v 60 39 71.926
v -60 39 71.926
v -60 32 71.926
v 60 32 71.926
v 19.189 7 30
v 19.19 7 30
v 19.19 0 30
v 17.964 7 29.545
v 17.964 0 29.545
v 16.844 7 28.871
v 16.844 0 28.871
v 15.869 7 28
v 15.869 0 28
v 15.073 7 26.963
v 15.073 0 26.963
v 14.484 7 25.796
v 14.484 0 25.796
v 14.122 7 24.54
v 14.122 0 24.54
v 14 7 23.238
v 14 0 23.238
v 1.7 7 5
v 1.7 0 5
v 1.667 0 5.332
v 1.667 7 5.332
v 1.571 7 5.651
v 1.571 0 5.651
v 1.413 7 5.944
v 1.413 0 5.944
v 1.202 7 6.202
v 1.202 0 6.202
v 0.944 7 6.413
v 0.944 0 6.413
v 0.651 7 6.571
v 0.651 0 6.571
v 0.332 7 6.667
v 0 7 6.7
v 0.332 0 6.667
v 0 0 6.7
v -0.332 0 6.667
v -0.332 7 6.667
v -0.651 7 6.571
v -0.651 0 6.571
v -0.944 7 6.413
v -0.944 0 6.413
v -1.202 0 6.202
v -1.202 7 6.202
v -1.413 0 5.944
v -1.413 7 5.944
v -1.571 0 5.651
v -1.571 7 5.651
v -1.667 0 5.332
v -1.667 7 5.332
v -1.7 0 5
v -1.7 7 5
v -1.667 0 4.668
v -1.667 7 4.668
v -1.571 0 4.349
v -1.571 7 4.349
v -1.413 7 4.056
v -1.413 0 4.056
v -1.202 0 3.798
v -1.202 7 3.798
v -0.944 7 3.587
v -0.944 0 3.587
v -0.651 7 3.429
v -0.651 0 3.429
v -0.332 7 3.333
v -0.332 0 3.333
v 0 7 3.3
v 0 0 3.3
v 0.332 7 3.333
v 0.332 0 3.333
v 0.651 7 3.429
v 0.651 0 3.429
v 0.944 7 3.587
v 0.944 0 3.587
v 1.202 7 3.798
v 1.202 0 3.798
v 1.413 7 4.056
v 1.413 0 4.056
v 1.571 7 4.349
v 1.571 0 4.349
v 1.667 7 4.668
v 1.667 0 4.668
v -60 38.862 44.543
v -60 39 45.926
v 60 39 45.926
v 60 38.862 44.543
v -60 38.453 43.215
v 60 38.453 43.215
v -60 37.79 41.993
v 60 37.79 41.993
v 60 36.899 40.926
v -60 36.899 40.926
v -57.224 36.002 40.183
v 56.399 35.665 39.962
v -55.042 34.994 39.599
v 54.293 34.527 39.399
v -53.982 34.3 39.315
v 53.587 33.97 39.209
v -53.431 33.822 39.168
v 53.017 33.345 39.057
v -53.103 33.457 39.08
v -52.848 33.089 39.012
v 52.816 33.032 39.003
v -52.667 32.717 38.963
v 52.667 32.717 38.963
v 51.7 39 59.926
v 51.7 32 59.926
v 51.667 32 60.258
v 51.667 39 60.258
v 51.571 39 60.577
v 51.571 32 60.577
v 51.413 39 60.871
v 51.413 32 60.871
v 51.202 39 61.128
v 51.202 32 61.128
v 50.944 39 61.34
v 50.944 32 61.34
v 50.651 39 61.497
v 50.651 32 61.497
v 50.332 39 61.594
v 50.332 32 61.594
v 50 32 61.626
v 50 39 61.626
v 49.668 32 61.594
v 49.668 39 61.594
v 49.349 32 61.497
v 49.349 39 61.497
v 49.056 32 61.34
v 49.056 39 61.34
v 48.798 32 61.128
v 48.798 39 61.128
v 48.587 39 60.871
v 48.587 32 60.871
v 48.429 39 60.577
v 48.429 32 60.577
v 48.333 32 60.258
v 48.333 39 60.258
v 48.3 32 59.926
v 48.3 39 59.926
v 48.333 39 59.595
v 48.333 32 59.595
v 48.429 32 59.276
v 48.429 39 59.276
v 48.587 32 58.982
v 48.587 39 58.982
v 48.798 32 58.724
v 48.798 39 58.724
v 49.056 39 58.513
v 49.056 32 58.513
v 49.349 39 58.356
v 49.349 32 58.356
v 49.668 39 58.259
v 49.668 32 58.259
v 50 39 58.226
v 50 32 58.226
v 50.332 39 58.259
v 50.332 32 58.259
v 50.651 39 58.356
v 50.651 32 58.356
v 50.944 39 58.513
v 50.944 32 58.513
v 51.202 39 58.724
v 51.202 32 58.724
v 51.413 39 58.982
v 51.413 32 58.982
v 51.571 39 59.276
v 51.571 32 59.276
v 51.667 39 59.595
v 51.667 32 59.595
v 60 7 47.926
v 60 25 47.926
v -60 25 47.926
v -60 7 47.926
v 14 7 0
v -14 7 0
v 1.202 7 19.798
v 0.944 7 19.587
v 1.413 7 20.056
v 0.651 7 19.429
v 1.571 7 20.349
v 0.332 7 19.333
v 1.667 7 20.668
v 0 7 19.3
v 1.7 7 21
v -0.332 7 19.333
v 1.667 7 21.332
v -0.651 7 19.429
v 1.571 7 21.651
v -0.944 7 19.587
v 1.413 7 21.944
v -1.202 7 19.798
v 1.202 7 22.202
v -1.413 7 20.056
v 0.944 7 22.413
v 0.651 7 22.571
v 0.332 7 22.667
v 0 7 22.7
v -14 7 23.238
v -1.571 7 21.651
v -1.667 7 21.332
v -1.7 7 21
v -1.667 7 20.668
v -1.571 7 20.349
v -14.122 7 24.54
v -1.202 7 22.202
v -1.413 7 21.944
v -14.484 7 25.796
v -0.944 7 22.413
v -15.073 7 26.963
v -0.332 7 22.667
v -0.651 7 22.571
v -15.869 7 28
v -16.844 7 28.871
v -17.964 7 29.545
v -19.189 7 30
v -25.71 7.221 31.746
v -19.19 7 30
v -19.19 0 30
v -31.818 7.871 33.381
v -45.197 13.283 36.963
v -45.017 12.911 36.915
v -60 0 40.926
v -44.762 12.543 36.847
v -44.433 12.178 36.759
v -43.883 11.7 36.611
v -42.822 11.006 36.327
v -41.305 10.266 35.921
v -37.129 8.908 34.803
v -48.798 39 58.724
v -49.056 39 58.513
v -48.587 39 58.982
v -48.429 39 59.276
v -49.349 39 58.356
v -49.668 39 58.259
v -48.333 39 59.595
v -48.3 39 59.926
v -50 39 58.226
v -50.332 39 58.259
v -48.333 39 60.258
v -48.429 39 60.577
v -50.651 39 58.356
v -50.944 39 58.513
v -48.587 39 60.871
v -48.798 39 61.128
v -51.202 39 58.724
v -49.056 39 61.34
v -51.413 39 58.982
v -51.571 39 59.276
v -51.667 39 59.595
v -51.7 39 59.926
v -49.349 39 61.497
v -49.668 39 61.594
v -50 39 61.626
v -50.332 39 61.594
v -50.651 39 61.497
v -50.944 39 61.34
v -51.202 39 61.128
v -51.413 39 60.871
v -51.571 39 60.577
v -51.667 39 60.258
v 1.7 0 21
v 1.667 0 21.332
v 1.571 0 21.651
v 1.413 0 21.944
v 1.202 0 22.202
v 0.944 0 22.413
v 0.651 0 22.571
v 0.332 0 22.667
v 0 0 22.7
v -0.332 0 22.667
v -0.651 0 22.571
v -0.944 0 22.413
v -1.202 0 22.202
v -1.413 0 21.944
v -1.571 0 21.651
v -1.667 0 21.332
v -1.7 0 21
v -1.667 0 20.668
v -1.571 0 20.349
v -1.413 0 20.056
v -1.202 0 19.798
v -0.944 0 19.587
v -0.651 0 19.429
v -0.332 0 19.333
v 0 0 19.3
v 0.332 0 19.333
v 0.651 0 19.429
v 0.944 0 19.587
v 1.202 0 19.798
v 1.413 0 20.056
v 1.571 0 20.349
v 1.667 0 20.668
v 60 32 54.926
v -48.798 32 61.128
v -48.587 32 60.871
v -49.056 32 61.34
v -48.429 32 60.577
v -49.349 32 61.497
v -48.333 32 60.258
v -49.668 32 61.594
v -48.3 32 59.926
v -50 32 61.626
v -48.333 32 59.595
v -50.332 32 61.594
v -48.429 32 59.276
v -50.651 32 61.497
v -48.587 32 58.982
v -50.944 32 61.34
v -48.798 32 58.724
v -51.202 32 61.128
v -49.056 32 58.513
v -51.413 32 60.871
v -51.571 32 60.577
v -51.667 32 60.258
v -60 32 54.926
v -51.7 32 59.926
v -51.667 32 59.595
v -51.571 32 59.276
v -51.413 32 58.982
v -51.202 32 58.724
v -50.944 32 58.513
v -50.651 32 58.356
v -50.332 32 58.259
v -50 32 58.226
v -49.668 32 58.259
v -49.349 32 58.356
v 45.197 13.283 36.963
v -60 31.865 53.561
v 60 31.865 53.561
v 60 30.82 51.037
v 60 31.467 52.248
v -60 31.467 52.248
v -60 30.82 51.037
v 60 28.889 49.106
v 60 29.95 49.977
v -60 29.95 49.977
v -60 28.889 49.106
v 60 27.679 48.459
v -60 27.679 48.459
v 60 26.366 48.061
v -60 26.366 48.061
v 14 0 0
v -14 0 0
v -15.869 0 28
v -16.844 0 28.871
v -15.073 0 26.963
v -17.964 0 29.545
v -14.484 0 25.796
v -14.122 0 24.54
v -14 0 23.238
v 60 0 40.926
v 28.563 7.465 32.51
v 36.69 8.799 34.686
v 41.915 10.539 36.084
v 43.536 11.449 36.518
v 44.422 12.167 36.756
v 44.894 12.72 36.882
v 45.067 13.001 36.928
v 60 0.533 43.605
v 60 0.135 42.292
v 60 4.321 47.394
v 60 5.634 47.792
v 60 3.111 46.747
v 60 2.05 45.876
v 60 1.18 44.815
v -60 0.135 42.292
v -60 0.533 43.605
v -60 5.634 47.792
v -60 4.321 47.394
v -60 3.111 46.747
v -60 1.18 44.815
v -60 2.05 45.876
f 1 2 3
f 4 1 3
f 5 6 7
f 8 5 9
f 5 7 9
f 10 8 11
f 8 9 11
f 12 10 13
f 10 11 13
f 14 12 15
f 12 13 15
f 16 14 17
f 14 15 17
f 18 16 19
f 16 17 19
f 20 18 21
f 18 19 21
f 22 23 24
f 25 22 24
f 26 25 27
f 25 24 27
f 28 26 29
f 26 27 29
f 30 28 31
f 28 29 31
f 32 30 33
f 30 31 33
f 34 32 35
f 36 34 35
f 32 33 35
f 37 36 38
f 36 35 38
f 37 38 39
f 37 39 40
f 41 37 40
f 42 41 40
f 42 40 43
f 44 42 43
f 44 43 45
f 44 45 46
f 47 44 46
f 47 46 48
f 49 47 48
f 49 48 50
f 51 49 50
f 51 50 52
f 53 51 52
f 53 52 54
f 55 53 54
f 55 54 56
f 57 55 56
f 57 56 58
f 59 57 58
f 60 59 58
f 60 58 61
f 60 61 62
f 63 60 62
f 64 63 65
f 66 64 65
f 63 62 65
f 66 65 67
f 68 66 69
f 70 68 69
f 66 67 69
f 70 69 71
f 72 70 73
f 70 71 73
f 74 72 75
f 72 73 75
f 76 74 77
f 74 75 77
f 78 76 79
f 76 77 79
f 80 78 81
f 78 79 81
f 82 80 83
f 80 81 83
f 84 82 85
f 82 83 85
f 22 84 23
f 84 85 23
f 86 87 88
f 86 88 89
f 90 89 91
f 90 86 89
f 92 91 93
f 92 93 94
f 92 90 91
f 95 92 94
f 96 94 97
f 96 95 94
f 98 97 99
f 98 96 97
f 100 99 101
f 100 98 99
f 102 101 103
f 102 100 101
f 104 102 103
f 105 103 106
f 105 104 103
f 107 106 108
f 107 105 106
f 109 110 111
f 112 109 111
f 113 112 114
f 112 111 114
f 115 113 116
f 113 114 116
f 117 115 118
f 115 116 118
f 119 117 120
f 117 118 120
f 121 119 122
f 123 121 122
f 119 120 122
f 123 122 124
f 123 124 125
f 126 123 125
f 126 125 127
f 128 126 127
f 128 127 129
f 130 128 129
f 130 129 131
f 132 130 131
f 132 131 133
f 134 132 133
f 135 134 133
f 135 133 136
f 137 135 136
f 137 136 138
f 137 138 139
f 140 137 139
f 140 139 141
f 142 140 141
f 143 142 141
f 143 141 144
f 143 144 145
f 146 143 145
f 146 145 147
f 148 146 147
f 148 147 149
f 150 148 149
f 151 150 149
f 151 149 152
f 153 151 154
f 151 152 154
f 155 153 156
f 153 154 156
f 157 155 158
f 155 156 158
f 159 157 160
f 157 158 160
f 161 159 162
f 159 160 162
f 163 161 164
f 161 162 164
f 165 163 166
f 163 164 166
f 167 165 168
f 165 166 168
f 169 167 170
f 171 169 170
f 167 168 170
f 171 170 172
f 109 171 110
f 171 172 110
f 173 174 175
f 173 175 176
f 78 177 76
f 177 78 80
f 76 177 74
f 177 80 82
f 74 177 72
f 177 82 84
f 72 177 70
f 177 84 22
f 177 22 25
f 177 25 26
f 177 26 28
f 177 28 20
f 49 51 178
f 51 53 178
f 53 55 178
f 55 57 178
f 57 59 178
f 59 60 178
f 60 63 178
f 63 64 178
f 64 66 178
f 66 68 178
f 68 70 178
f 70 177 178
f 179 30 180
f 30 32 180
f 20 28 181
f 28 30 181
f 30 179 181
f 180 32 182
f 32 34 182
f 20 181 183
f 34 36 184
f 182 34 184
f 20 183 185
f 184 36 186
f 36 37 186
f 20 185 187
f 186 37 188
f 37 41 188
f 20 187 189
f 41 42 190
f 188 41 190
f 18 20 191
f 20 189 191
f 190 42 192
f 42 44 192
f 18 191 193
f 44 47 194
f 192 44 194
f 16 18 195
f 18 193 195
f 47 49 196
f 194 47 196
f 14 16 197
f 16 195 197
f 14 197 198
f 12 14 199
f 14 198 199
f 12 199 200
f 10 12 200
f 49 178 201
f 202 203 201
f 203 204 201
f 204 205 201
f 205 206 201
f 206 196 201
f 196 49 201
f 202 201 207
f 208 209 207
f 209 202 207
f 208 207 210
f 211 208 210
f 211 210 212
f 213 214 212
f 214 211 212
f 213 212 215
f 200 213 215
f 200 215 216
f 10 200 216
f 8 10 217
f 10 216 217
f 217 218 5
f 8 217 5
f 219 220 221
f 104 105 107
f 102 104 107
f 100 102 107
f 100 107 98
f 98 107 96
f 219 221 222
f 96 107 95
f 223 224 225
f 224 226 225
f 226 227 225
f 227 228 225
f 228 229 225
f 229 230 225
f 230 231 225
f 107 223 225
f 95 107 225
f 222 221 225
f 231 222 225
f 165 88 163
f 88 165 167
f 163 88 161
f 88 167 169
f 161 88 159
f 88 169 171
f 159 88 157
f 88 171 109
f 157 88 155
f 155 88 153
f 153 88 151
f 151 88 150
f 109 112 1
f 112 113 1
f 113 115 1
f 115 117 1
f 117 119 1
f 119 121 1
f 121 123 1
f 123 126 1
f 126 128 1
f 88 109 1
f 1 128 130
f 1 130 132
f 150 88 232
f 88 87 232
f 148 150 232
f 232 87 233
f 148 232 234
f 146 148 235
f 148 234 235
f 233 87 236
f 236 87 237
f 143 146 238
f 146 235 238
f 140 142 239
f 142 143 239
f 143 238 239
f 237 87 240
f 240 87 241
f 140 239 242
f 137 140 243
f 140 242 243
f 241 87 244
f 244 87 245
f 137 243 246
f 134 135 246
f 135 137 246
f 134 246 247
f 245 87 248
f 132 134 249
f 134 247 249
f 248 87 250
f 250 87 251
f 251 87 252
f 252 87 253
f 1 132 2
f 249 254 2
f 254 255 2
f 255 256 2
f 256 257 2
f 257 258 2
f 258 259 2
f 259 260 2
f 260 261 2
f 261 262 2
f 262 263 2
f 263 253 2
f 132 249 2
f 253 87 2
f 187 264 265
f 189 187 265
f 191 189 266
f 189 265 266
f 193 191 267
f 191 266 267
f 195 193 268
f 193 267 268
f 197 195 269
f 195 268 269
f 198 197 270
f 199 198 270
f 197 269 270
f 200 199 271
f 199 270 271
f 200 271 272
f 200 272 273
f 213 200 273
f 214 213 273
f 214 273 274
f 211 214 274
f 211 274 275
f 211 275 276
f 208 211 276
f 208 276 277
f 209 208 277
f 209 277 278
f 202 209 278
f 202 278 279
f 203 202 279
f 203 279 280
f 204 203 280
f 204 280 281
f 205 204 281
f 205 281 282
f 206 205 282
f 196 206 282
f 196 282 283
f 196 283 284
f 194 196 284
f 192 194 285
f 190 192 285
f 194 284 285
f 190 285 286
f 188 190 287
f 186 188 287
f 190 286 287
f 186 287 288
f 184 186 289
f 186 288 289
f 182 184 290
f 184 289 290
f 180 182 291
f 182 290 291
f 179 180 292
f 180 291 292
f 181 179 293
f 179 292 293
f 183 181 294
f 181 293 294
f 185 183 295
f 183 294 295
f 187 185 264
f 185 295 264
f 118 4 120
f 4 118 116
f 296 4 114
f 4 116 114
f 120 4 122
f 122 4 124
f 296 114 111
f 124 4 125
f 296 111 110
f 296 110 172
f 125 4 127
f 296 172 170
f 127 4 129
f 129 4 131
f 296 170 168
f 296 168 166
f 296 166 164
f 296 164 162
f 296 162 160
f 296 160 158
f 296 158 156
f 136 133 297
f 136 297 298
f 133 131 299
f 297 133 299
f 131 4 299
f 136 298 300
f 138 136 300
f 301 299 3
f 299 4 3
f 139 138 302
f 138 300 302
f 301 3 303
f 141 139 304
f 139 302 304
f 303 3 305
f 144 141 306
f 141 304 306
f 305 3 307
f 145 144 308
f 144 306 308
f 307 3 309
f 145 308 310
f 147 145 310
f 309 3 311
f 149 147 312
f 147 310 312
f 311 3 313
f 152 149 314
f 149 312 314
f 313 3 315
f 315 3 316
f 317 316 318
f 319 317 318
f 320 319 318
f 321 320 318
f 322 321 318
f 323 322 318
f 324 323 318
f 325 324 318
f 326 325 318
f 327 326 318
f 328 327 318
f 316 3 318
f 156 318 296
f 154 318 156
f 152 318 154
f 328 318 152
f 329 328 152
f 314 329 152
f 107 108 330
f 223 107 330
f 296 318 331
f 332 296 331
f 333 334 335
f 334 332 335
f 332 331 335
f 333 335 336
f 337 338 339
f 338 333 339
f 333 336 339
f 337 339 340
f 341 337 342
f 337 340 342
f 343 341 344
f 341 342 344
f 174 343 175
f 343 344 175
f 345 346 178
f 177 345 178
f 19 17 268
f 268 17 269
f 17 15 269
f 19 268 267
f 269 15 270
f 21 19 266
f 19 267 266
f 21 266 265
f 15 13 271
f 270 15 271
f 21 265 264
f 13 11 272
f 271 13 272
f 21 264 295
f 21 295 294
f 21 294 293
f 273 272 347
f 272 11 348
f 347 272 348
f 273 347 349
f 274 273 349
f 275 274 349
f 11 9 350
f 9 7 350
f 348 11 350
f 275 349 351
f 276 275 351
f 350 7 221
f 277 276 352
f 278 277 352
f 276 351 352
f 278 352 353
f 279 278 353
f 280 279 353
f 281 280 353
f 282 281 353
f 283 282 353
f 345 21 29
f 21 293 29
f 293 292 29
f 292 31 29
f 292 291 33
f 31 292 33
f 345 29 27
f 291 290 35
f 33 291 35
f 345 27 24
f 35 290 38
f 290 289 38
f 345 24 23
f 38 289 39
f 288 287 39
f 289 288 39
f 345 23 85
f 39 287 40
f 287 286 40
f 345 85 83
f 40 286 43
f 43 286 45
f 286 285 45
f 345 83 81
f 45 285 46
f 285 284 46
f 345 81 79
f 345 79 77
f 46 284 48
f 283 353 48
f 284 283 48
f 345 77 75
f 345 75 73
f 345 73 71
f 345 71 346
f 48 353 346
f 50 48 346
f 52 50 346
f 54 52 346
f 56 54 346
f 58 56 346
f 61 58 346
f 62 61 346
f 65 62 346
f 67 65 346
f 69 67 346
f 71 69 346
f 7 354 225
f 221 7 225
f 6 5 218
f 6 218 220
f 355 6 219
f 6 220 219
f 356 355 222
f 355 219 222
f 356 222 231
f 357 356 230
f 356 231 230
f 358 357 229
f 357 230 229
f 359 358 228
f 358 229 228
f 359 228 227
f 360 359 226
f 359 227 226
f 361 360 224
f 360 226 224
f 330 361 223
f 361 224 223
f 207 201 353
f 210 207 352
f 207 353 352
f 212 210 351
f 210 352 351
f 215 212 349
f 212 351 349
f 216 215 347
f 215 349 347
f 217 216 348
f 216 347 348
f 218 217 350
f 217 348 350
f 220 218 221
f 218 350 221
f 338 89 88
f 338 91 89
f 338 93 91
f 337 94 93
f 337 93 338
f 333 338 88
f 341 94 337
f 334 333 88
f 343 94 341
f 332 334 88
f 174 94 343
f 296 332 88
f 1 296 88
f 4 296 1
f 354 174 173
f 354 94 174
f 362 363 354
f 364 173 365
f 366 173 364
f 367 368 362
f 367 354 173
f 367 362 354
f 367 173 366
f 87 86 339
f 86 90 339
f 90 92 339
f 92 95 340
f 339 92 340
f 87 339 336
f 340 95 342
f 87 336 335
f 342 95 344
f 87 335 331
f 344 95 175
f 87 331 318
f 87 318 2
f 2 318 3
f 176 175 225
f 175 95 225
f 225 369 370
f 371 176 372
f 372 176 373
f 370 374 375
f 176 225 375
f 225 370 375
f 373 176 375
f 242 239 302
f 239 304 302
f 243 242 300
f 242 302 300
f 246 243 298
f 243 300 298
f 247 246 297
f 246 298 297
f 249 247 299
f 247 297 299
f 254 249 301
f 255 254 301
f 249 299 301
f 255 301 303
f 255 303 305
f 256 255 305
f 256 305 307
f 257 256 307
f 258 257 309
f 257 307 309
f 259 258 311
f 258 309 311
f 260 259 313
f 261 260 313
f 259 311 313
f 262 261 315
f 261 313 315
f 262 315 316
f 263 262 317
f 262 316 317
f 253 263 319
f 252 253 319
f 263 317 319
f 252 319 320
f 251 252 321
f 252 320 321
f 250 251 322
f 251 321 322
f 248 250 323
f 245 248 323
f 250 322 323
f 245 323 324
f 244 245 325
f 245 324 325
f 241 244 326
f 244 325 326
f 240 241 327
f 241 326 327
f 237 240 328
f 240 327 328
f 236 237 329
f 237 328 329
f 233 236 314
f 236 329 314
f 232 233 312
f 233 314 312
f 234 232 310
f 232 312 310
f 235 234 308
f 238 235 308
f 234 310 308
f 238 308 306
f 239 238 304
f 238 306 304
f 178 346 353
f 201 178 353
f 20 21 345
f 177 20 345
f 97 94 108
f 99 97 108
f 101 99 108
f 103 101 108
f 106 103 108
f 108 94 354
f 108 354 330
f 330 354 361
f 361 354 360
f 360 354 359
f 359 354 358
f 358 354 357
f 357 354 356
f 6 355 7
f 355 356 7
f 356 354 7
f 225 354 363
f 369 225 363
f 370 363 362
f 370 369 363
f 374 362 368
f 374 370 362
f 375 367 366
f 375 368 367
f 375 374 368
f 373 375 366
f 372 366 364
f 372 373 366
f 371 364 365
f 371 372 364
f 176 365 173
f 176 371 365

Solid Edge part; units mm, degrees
sketch "Sketch1" plane through (0, 0, 0) normal (1, 0, 0) x (0, 1, 0)
  line L0 (0, 0) -> (7, 0)
  line L1 (7, 0) -> (7, 30)
  arc A0 (7, 30) -> (13.2834, 36.9632) centre (14, 30) cw
  line L2 (32.7166, 38.9632) -> (13.2834, 36.9632)
  arc A1 (39, 45.9264) -> (32.7166, 38.9632) centre (32, 45.9264) cw
  line L3 (39, 45.9264) -> (39, 71.9264)
  line L4 (39, 71.9264) -> (32, 71.9264)
  line L5 (32, 71.9264) -> (32, 54.9264)
  arc A2 (25, 47.9264) -> (32, 54.9264) centre (25, 54.9264) ccw
  line L6 (25, 47.9264) -> (7, 47.9264)
  arc A3 (7, 47.9264) -> (0, 40.9264) centre (7, 40.9264) ccw
  line L7 (0, 40.9264) -> (0, 0)
  dimension "D1" = 7
  dimension "D2" = 25
  dimension "D3" = 2
  dimension "D4" = 30
  dimension "D5" = 24
  dimension "D6" = 2
  dimension "D7" = 7
extrude "Protrusion1" add sketch "Sketch1" along normal mid plane 120
sketch "Sketch2" plane through (0, 0, 25.1762) normal (0, -1, 0) x (1, 0, 0)
  circle A0 centre (0, -4.1762) radius 1.7
  circle A1 centre (0, -20.1762) radius 1.7
  circle A2 centre (-50, 34.7502) radius 1.7
  circle A3 centre (50, 34.7502) radius 1.7
  dimension "D1" = 3.4
  dimension "D2" = 5
  dimension "D3" = 16
  dimension "D4" = 12
  dimension "D5" = 50
extrude "Cutout1" cut sketch "Sketch2" against normal through all
sketch "Sketch3" plane through (0, 0, 0) normal (0, -1, 0) x (1, 0, 0)
  line L0 (-14, 0) -> (-14, 23.2382)
  arc A0 (-19.1896, 30) -> (-14, 23.2382) centre (-21, 23.2382) cw
  line L1 (-19.1896, 30) -> (-60, 40.9264)
  line L2 (-60, 40.9264) -> (-101.8817, 40.9264)
  line L3 (-101.8817, 40.9264) -> (-101.8817, -44.3186)
  line L4 (-101.8817, -44.3186) -> (159.9543, -44.3186)
  line L5 (159.9543, -44.3186) -> (159.9543, 40.9264)
  line L6 (159.9543, 40.9264) -> (60, 40.9264)
  line L7 (60, 40.9264) -> (19.1896, 30)
  arc A1 (14, 23.2382) -> (19.1896, 30) centre (21, 23.2382) cw
  line L8 (14, 23.2382) -> (14, 0)
  line L9 (14, 0) -> (-14, 0)
  dimension "D1" = 28
  dimension "D2" = 7
  dimension "D3" = 30
extrude "Cutout2" cut sketch "Sketch3" against normal through all
